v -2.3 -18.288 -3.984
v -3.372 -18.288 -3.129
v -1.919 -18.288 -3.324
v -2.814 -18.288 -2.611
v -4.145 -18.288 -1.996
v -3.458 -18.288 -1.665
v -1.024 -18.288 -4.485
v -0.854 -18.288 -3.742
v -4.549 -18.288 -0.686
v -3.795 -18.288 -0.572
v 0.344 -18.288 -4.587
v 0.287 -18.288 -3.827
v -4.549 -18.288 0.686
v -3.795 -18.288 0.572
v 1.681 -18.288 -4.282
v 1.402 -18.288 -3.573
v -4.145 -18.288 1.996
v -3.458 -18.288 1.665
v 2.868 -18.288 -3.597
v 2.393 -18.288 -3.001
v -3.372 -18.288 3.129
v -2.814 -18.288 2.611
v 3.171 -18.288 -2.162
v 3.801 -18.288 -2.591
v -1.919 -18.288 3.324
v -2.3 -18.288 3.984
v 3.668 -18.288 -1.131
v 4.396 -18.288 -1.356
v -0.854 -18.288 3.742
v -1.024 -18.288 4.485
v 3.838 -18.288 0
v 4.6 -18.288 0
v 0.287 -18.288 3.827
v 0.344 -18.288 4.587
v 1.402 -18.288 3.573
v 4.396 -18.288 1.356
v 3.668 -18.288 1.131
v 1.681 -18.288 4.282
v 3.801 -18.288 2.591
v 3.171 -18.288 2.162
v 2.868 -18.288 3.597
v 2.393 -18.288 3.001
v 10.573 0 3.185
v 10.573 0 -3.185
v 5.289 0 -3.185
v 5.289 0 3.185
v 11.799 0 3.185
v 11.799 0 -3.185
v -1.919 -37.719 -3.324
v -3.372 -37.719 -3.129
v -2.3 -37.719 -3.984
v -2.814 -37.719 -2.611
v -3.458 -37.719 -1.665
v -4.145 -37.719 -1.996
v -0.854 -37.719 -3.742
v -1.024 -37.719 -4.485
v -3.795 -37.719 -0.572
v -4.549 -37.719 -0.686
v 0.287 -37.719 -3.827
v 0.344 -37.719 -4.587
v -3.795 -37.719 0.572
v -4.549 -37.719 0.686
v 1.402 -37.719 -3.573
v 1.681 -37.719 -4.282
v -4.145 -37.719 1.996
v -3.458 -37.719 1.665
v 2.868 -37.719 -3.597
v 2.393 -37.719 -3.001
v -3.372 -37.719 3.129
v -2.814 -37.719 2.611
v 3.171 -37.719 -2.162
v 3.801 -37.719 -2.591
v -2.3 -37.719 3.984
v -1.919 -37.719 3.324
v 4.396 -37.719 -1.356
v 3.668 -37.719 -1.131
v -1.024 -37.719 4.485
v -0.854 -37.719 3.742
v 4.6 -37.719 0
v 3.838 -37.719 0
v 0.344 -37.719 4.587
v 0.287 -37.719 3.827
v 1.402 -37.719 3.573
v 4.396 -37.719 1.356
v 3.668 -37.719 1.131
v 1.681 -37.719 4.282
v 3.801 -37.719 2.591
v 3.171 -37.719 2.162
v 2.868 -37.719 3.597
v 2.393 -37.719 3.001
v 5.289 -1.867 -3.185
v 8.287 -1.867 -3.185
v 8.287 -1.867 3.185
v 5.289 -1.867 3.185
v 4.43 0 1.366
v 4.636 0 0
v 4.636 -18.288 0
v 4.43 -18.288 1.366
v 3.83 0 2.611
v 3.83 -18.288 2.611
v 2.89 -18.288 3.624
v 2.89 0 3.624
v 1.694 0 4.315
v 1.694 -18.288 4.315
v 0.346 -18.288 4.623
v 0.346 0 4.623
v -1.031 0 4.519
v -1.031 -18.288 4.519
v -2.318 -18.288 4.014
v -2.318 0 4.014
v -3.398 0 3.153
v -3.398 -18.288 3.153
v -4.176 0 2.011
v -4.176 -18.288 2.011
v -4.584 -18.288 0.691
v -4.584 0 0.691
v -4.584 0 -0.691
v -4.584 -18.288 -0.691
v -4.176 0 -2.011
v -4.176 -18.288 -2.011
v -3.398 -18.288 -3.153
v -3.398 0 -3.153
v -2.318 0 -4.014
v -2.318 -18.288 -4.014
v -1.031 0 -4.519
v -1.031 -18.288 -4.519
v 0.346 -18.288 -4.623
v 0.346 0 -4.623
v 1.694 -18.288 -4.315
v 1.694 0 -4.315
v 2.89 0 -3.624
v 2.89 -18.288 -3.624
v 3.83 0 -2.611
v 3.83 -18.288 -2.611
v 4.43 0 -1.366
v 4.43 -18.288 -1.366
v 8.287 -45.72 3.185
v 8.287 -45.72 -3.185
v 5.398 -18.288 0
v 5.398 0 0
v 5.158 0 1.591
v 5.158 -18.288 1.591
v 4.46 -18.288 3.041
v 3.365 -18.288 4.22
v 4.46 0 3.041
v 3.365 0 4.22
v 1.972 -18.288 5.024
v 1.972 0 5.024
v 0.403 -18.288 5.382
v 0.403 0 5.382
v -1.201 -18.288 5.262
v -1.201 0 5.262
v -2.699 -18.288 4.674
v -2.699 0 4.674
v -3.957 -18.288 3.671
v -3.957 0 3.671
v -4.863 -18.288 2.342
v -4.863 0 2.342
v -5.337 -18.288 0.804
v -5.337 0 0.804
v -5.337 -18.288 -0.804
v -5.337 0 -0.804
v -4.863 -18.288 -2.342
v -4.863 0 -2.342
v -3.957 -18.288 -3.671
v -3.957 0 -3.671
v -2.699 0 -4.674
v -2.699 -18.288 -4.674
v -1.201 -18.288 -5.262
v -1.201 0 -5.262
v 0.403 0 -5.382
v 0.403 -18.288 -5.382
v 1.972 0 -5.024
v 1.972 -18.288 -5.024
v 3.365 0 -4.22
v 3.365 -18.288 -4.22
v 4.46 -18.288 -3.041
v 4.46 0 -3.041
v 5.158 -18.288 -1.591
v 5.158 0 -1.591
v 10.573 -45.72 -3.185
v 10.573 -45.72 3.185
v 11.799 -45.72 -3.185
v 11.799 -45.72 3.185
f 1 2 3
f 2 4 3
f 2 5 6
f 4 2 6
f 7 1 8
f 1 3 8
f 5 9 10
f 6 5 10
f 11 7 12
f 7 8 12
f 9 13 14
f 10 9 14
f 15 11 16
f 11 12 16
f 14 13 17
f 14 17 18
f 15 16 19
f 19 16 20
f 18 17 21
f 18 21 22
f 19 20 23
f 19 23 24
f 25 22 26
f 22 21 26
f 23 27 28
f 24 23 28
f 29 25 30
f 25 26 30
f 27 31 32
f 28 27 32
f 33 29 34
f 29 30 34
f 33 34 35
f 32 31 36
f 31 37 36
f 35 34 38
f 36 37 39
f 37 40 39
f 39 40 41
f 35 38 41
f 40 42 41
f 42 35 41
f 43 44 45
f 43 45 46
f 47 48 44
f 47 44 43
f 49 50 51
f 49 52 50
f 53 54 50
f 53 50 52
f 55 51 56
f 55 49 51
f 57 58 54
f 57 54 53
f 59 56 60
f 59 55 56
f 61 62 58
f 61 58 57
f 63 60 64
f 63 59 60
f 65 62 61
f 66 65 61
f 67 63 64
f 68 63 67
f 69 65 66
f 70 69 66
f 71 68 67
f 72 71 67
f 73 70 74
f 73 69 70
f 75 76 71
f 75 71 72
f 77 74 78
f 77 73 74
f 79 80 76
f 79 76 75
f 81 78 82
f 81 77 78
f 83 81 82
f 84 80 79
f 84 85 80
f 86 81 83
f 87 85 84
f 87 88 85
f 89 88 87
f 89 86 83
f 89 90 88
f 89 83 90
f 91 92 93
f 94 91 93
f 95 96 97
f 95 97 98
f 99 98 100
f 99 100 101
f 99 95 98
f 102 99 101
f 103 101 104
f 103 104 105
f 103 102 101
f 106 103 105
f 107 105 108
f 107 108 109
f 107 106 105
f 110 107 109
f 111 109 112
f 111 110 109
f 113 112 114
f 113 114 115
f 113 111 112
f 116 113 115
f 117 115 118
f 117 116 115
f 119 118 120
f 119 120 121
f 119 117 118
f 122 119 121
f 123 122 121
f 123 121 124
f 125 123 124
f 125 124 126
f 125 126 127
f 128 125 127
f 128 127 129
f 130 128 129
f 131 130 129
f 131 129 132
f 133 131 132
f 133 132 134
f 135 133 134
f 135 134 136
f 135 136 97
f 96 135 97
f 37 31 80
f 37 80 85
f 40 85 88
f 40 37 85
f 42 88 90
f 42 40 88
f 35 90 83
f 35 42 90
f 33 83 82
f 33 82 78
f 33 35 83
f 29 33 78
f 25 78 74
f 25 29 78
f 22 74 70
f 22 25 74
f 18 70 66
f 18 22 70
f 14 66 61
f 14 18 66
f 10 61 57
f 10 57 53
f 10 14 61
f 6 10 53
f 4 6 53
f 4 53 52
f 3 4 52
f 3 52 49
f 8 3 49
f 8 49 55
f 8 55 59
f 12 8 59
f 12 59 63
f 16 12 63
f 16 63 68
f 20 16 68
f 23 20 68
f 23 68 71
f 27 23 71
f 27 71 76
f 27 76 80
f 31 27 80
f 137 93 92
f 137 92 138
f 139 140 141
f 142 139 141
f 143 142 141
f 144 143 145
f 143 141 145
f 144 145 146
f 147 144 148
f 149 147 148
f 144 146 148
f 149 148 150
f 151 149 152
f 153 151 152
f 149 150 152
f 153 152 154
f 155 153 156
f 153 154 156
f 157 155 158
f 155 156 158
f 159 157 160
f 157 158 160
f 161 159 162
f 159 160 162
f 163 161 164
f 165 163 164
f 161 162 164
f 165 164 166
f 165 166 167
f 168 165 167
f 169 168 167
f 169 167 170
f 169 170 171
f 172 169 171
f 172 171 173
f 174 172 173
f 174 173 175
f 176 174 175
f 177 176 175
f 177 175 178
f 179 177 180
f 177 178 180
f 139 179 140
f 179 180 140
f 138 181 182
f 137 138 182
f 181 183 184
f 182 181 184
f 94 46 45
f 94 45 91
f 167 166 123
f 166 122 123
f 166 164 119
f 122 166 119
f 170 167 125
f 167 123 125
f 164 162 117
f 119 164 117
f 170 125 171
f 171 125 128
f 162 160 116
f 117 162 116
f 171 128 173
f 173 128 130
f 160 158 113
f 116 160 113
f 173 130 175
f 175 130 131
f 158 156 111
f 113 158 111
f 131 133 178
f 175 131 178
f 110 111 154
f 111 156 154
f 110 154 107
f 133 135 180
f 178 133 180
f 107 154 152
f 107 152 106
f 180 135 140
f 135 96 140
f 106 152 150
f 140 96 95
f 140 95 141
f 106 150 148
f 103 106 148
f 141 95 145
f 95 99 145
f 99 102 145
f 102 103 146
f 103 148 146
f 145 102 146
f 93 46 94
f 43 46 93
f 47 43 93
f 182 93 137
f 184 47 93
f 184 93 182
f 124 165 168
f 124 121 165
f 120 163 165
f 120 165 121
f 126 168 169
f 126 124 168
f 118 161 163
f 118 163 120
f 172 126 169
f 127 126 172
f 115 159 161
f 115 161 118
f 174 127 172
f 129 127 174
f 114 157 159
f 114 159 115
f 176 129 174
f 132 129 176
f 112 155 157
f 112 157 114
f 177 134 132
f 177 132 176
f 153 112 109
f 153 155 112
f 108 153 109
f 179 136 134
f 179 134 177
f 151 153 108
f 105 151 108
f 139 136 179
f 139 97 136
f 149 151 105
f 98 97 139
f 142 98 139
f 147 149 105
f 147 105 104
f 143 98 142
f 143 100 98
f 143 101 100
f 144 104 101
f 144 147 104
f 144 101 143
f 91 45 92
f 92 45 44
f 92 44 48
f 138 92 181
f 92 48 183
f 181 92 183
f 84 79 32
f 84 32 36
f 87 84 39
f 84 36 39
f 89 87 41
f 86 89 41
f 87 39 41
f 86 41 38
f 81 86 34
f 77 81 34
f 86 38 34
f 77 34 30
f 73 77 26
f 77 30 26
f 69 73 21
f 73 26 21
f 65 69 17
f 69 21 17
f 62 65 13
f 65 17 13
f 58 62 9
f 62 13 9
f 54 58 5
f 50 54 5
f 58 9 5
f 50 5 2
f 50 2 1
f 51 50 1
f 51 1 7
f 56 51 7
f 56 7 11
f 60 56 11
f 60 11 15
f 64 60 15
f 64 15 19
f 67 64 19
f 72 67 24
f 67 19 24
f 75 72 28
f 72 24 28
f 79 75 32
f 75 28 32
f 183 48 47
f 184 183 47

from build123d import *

# Parameters (mm, degrees)
F0_R      = 5.3975
F1_DEPTH  = 18.288
F2_T      = -0.762
F3_R      = 4.600211285
F4_DEPTH  = 19.431
F5_T      = -0.762
F6_W      = 4.6940159253
F6_H      = 10.2641077222
F7_DEPTH  = 45.72
F8_W      = 3.4673514045
F8_H      = 45.72
F9_DEPTH  = 25.4
F10_W     = 45.72
F10_H     = 1.9464063645
F10_H_2   = 1.9479215399
F11_DEPTH = 25.4
F12_W     = 1.8670405261
F12_H     = 6.3697798178
F13_DEPTH = 5.2832
F14_W     = 43.8529594739
F14_H     = 6.3697798178
F15_DEPTH = 2.286


with BuildPart() as f1:
    # F0 (on Front) → F1 (new body)
    with BuildSketch(Plane.XZ):
        Circle(F0_R)
    extrude(amount=F1_DEPTH)

    # F2
    f2_openings = [f1.faces().sort_by_distance(p)[0] for p in [
        (0, 0, 0),
        (0, -18.288, 0),
    ]]
    offset(amount=F2_T, openings=f2_openings)


with BuildPart() as f4:
    # F3 (on face) → F4 (new body)
    with BuildSketch(Plane.XZ.offset(18.288)):
        Circle(F3_R)
    extrude(amount=F4_DEPTH)

    # F5
    f5_openings = [f4.faces().sort_by_distance(p)[0] for p in [
        (0, -37.719, 0),
        (0, -18.288, 0),
    ]]
    offset(amount=F5_T, openings=f5_openings)


with BuildPart() as f7:
    # F6 (on face) → F7 (new body)
    with BuildSketch(Plane(origin=(0, 0, 0), x_dir=(-1, 0, 0), z_dir=(0, 1, 0))):
        with Locations((-9.4523209978, -0.0007575877)):
            Rectangle(F6_W, F6_H)
    extrude(amount=-F7_DEPTH)

    # F8 (on face) → F9 (cut)
    with BuildSketch(Plane(origin=(0, 0, -5.1328114488), x_dir=(1, 0, 0), z_dir=(0, 0, -1))):
        with Locations((8.8389887374, 22.86)):
            Rectangle(F8_W, F8_H)
    extrude(amount=-F9_DEPTH, mode=Mode.SUBTRACT)

    # F10 (on face) → F11 (cut)
    with BuildSketch(Plane.YZ.offset(11.7993289605)):
        with Locations((-22.86, 4.1580930911)):
            Rectangle(F10_W, F10_H)
        with Locations((-22.86, -4.1588506788)):
            Rectangle(F10_W, F10_H_2)
    extrude(amount=-F11_DEPTH, mode=Mode.SUBTRACT)

    # F12 (on face) → F13 (join)
    with BuildSketch(Plane(origin=(10.5726644397, 0, 0), x_dir=(0, -1, 0), z_dir=(-1, 0, 0))):
        with Locations((0.9335202631, 0)):
            Rectangle(F12_W, F12_H)
    extrude(amount=F13_DEPTH)

    # F14 (on face) → F15 (join)
    with BuildSketch(Plane(origin=(10.5726644397, 0, 0), x_dir=(0, -1, 0), z_dir=(-1, 0, 0))):
        with Locations((23.7935202631, 0)):
            Rectangle(F14_W, F14_H)
    extrude(amount=F15_DEPTH)


solid = Compound([f1.part, f4.part, f7.part])
